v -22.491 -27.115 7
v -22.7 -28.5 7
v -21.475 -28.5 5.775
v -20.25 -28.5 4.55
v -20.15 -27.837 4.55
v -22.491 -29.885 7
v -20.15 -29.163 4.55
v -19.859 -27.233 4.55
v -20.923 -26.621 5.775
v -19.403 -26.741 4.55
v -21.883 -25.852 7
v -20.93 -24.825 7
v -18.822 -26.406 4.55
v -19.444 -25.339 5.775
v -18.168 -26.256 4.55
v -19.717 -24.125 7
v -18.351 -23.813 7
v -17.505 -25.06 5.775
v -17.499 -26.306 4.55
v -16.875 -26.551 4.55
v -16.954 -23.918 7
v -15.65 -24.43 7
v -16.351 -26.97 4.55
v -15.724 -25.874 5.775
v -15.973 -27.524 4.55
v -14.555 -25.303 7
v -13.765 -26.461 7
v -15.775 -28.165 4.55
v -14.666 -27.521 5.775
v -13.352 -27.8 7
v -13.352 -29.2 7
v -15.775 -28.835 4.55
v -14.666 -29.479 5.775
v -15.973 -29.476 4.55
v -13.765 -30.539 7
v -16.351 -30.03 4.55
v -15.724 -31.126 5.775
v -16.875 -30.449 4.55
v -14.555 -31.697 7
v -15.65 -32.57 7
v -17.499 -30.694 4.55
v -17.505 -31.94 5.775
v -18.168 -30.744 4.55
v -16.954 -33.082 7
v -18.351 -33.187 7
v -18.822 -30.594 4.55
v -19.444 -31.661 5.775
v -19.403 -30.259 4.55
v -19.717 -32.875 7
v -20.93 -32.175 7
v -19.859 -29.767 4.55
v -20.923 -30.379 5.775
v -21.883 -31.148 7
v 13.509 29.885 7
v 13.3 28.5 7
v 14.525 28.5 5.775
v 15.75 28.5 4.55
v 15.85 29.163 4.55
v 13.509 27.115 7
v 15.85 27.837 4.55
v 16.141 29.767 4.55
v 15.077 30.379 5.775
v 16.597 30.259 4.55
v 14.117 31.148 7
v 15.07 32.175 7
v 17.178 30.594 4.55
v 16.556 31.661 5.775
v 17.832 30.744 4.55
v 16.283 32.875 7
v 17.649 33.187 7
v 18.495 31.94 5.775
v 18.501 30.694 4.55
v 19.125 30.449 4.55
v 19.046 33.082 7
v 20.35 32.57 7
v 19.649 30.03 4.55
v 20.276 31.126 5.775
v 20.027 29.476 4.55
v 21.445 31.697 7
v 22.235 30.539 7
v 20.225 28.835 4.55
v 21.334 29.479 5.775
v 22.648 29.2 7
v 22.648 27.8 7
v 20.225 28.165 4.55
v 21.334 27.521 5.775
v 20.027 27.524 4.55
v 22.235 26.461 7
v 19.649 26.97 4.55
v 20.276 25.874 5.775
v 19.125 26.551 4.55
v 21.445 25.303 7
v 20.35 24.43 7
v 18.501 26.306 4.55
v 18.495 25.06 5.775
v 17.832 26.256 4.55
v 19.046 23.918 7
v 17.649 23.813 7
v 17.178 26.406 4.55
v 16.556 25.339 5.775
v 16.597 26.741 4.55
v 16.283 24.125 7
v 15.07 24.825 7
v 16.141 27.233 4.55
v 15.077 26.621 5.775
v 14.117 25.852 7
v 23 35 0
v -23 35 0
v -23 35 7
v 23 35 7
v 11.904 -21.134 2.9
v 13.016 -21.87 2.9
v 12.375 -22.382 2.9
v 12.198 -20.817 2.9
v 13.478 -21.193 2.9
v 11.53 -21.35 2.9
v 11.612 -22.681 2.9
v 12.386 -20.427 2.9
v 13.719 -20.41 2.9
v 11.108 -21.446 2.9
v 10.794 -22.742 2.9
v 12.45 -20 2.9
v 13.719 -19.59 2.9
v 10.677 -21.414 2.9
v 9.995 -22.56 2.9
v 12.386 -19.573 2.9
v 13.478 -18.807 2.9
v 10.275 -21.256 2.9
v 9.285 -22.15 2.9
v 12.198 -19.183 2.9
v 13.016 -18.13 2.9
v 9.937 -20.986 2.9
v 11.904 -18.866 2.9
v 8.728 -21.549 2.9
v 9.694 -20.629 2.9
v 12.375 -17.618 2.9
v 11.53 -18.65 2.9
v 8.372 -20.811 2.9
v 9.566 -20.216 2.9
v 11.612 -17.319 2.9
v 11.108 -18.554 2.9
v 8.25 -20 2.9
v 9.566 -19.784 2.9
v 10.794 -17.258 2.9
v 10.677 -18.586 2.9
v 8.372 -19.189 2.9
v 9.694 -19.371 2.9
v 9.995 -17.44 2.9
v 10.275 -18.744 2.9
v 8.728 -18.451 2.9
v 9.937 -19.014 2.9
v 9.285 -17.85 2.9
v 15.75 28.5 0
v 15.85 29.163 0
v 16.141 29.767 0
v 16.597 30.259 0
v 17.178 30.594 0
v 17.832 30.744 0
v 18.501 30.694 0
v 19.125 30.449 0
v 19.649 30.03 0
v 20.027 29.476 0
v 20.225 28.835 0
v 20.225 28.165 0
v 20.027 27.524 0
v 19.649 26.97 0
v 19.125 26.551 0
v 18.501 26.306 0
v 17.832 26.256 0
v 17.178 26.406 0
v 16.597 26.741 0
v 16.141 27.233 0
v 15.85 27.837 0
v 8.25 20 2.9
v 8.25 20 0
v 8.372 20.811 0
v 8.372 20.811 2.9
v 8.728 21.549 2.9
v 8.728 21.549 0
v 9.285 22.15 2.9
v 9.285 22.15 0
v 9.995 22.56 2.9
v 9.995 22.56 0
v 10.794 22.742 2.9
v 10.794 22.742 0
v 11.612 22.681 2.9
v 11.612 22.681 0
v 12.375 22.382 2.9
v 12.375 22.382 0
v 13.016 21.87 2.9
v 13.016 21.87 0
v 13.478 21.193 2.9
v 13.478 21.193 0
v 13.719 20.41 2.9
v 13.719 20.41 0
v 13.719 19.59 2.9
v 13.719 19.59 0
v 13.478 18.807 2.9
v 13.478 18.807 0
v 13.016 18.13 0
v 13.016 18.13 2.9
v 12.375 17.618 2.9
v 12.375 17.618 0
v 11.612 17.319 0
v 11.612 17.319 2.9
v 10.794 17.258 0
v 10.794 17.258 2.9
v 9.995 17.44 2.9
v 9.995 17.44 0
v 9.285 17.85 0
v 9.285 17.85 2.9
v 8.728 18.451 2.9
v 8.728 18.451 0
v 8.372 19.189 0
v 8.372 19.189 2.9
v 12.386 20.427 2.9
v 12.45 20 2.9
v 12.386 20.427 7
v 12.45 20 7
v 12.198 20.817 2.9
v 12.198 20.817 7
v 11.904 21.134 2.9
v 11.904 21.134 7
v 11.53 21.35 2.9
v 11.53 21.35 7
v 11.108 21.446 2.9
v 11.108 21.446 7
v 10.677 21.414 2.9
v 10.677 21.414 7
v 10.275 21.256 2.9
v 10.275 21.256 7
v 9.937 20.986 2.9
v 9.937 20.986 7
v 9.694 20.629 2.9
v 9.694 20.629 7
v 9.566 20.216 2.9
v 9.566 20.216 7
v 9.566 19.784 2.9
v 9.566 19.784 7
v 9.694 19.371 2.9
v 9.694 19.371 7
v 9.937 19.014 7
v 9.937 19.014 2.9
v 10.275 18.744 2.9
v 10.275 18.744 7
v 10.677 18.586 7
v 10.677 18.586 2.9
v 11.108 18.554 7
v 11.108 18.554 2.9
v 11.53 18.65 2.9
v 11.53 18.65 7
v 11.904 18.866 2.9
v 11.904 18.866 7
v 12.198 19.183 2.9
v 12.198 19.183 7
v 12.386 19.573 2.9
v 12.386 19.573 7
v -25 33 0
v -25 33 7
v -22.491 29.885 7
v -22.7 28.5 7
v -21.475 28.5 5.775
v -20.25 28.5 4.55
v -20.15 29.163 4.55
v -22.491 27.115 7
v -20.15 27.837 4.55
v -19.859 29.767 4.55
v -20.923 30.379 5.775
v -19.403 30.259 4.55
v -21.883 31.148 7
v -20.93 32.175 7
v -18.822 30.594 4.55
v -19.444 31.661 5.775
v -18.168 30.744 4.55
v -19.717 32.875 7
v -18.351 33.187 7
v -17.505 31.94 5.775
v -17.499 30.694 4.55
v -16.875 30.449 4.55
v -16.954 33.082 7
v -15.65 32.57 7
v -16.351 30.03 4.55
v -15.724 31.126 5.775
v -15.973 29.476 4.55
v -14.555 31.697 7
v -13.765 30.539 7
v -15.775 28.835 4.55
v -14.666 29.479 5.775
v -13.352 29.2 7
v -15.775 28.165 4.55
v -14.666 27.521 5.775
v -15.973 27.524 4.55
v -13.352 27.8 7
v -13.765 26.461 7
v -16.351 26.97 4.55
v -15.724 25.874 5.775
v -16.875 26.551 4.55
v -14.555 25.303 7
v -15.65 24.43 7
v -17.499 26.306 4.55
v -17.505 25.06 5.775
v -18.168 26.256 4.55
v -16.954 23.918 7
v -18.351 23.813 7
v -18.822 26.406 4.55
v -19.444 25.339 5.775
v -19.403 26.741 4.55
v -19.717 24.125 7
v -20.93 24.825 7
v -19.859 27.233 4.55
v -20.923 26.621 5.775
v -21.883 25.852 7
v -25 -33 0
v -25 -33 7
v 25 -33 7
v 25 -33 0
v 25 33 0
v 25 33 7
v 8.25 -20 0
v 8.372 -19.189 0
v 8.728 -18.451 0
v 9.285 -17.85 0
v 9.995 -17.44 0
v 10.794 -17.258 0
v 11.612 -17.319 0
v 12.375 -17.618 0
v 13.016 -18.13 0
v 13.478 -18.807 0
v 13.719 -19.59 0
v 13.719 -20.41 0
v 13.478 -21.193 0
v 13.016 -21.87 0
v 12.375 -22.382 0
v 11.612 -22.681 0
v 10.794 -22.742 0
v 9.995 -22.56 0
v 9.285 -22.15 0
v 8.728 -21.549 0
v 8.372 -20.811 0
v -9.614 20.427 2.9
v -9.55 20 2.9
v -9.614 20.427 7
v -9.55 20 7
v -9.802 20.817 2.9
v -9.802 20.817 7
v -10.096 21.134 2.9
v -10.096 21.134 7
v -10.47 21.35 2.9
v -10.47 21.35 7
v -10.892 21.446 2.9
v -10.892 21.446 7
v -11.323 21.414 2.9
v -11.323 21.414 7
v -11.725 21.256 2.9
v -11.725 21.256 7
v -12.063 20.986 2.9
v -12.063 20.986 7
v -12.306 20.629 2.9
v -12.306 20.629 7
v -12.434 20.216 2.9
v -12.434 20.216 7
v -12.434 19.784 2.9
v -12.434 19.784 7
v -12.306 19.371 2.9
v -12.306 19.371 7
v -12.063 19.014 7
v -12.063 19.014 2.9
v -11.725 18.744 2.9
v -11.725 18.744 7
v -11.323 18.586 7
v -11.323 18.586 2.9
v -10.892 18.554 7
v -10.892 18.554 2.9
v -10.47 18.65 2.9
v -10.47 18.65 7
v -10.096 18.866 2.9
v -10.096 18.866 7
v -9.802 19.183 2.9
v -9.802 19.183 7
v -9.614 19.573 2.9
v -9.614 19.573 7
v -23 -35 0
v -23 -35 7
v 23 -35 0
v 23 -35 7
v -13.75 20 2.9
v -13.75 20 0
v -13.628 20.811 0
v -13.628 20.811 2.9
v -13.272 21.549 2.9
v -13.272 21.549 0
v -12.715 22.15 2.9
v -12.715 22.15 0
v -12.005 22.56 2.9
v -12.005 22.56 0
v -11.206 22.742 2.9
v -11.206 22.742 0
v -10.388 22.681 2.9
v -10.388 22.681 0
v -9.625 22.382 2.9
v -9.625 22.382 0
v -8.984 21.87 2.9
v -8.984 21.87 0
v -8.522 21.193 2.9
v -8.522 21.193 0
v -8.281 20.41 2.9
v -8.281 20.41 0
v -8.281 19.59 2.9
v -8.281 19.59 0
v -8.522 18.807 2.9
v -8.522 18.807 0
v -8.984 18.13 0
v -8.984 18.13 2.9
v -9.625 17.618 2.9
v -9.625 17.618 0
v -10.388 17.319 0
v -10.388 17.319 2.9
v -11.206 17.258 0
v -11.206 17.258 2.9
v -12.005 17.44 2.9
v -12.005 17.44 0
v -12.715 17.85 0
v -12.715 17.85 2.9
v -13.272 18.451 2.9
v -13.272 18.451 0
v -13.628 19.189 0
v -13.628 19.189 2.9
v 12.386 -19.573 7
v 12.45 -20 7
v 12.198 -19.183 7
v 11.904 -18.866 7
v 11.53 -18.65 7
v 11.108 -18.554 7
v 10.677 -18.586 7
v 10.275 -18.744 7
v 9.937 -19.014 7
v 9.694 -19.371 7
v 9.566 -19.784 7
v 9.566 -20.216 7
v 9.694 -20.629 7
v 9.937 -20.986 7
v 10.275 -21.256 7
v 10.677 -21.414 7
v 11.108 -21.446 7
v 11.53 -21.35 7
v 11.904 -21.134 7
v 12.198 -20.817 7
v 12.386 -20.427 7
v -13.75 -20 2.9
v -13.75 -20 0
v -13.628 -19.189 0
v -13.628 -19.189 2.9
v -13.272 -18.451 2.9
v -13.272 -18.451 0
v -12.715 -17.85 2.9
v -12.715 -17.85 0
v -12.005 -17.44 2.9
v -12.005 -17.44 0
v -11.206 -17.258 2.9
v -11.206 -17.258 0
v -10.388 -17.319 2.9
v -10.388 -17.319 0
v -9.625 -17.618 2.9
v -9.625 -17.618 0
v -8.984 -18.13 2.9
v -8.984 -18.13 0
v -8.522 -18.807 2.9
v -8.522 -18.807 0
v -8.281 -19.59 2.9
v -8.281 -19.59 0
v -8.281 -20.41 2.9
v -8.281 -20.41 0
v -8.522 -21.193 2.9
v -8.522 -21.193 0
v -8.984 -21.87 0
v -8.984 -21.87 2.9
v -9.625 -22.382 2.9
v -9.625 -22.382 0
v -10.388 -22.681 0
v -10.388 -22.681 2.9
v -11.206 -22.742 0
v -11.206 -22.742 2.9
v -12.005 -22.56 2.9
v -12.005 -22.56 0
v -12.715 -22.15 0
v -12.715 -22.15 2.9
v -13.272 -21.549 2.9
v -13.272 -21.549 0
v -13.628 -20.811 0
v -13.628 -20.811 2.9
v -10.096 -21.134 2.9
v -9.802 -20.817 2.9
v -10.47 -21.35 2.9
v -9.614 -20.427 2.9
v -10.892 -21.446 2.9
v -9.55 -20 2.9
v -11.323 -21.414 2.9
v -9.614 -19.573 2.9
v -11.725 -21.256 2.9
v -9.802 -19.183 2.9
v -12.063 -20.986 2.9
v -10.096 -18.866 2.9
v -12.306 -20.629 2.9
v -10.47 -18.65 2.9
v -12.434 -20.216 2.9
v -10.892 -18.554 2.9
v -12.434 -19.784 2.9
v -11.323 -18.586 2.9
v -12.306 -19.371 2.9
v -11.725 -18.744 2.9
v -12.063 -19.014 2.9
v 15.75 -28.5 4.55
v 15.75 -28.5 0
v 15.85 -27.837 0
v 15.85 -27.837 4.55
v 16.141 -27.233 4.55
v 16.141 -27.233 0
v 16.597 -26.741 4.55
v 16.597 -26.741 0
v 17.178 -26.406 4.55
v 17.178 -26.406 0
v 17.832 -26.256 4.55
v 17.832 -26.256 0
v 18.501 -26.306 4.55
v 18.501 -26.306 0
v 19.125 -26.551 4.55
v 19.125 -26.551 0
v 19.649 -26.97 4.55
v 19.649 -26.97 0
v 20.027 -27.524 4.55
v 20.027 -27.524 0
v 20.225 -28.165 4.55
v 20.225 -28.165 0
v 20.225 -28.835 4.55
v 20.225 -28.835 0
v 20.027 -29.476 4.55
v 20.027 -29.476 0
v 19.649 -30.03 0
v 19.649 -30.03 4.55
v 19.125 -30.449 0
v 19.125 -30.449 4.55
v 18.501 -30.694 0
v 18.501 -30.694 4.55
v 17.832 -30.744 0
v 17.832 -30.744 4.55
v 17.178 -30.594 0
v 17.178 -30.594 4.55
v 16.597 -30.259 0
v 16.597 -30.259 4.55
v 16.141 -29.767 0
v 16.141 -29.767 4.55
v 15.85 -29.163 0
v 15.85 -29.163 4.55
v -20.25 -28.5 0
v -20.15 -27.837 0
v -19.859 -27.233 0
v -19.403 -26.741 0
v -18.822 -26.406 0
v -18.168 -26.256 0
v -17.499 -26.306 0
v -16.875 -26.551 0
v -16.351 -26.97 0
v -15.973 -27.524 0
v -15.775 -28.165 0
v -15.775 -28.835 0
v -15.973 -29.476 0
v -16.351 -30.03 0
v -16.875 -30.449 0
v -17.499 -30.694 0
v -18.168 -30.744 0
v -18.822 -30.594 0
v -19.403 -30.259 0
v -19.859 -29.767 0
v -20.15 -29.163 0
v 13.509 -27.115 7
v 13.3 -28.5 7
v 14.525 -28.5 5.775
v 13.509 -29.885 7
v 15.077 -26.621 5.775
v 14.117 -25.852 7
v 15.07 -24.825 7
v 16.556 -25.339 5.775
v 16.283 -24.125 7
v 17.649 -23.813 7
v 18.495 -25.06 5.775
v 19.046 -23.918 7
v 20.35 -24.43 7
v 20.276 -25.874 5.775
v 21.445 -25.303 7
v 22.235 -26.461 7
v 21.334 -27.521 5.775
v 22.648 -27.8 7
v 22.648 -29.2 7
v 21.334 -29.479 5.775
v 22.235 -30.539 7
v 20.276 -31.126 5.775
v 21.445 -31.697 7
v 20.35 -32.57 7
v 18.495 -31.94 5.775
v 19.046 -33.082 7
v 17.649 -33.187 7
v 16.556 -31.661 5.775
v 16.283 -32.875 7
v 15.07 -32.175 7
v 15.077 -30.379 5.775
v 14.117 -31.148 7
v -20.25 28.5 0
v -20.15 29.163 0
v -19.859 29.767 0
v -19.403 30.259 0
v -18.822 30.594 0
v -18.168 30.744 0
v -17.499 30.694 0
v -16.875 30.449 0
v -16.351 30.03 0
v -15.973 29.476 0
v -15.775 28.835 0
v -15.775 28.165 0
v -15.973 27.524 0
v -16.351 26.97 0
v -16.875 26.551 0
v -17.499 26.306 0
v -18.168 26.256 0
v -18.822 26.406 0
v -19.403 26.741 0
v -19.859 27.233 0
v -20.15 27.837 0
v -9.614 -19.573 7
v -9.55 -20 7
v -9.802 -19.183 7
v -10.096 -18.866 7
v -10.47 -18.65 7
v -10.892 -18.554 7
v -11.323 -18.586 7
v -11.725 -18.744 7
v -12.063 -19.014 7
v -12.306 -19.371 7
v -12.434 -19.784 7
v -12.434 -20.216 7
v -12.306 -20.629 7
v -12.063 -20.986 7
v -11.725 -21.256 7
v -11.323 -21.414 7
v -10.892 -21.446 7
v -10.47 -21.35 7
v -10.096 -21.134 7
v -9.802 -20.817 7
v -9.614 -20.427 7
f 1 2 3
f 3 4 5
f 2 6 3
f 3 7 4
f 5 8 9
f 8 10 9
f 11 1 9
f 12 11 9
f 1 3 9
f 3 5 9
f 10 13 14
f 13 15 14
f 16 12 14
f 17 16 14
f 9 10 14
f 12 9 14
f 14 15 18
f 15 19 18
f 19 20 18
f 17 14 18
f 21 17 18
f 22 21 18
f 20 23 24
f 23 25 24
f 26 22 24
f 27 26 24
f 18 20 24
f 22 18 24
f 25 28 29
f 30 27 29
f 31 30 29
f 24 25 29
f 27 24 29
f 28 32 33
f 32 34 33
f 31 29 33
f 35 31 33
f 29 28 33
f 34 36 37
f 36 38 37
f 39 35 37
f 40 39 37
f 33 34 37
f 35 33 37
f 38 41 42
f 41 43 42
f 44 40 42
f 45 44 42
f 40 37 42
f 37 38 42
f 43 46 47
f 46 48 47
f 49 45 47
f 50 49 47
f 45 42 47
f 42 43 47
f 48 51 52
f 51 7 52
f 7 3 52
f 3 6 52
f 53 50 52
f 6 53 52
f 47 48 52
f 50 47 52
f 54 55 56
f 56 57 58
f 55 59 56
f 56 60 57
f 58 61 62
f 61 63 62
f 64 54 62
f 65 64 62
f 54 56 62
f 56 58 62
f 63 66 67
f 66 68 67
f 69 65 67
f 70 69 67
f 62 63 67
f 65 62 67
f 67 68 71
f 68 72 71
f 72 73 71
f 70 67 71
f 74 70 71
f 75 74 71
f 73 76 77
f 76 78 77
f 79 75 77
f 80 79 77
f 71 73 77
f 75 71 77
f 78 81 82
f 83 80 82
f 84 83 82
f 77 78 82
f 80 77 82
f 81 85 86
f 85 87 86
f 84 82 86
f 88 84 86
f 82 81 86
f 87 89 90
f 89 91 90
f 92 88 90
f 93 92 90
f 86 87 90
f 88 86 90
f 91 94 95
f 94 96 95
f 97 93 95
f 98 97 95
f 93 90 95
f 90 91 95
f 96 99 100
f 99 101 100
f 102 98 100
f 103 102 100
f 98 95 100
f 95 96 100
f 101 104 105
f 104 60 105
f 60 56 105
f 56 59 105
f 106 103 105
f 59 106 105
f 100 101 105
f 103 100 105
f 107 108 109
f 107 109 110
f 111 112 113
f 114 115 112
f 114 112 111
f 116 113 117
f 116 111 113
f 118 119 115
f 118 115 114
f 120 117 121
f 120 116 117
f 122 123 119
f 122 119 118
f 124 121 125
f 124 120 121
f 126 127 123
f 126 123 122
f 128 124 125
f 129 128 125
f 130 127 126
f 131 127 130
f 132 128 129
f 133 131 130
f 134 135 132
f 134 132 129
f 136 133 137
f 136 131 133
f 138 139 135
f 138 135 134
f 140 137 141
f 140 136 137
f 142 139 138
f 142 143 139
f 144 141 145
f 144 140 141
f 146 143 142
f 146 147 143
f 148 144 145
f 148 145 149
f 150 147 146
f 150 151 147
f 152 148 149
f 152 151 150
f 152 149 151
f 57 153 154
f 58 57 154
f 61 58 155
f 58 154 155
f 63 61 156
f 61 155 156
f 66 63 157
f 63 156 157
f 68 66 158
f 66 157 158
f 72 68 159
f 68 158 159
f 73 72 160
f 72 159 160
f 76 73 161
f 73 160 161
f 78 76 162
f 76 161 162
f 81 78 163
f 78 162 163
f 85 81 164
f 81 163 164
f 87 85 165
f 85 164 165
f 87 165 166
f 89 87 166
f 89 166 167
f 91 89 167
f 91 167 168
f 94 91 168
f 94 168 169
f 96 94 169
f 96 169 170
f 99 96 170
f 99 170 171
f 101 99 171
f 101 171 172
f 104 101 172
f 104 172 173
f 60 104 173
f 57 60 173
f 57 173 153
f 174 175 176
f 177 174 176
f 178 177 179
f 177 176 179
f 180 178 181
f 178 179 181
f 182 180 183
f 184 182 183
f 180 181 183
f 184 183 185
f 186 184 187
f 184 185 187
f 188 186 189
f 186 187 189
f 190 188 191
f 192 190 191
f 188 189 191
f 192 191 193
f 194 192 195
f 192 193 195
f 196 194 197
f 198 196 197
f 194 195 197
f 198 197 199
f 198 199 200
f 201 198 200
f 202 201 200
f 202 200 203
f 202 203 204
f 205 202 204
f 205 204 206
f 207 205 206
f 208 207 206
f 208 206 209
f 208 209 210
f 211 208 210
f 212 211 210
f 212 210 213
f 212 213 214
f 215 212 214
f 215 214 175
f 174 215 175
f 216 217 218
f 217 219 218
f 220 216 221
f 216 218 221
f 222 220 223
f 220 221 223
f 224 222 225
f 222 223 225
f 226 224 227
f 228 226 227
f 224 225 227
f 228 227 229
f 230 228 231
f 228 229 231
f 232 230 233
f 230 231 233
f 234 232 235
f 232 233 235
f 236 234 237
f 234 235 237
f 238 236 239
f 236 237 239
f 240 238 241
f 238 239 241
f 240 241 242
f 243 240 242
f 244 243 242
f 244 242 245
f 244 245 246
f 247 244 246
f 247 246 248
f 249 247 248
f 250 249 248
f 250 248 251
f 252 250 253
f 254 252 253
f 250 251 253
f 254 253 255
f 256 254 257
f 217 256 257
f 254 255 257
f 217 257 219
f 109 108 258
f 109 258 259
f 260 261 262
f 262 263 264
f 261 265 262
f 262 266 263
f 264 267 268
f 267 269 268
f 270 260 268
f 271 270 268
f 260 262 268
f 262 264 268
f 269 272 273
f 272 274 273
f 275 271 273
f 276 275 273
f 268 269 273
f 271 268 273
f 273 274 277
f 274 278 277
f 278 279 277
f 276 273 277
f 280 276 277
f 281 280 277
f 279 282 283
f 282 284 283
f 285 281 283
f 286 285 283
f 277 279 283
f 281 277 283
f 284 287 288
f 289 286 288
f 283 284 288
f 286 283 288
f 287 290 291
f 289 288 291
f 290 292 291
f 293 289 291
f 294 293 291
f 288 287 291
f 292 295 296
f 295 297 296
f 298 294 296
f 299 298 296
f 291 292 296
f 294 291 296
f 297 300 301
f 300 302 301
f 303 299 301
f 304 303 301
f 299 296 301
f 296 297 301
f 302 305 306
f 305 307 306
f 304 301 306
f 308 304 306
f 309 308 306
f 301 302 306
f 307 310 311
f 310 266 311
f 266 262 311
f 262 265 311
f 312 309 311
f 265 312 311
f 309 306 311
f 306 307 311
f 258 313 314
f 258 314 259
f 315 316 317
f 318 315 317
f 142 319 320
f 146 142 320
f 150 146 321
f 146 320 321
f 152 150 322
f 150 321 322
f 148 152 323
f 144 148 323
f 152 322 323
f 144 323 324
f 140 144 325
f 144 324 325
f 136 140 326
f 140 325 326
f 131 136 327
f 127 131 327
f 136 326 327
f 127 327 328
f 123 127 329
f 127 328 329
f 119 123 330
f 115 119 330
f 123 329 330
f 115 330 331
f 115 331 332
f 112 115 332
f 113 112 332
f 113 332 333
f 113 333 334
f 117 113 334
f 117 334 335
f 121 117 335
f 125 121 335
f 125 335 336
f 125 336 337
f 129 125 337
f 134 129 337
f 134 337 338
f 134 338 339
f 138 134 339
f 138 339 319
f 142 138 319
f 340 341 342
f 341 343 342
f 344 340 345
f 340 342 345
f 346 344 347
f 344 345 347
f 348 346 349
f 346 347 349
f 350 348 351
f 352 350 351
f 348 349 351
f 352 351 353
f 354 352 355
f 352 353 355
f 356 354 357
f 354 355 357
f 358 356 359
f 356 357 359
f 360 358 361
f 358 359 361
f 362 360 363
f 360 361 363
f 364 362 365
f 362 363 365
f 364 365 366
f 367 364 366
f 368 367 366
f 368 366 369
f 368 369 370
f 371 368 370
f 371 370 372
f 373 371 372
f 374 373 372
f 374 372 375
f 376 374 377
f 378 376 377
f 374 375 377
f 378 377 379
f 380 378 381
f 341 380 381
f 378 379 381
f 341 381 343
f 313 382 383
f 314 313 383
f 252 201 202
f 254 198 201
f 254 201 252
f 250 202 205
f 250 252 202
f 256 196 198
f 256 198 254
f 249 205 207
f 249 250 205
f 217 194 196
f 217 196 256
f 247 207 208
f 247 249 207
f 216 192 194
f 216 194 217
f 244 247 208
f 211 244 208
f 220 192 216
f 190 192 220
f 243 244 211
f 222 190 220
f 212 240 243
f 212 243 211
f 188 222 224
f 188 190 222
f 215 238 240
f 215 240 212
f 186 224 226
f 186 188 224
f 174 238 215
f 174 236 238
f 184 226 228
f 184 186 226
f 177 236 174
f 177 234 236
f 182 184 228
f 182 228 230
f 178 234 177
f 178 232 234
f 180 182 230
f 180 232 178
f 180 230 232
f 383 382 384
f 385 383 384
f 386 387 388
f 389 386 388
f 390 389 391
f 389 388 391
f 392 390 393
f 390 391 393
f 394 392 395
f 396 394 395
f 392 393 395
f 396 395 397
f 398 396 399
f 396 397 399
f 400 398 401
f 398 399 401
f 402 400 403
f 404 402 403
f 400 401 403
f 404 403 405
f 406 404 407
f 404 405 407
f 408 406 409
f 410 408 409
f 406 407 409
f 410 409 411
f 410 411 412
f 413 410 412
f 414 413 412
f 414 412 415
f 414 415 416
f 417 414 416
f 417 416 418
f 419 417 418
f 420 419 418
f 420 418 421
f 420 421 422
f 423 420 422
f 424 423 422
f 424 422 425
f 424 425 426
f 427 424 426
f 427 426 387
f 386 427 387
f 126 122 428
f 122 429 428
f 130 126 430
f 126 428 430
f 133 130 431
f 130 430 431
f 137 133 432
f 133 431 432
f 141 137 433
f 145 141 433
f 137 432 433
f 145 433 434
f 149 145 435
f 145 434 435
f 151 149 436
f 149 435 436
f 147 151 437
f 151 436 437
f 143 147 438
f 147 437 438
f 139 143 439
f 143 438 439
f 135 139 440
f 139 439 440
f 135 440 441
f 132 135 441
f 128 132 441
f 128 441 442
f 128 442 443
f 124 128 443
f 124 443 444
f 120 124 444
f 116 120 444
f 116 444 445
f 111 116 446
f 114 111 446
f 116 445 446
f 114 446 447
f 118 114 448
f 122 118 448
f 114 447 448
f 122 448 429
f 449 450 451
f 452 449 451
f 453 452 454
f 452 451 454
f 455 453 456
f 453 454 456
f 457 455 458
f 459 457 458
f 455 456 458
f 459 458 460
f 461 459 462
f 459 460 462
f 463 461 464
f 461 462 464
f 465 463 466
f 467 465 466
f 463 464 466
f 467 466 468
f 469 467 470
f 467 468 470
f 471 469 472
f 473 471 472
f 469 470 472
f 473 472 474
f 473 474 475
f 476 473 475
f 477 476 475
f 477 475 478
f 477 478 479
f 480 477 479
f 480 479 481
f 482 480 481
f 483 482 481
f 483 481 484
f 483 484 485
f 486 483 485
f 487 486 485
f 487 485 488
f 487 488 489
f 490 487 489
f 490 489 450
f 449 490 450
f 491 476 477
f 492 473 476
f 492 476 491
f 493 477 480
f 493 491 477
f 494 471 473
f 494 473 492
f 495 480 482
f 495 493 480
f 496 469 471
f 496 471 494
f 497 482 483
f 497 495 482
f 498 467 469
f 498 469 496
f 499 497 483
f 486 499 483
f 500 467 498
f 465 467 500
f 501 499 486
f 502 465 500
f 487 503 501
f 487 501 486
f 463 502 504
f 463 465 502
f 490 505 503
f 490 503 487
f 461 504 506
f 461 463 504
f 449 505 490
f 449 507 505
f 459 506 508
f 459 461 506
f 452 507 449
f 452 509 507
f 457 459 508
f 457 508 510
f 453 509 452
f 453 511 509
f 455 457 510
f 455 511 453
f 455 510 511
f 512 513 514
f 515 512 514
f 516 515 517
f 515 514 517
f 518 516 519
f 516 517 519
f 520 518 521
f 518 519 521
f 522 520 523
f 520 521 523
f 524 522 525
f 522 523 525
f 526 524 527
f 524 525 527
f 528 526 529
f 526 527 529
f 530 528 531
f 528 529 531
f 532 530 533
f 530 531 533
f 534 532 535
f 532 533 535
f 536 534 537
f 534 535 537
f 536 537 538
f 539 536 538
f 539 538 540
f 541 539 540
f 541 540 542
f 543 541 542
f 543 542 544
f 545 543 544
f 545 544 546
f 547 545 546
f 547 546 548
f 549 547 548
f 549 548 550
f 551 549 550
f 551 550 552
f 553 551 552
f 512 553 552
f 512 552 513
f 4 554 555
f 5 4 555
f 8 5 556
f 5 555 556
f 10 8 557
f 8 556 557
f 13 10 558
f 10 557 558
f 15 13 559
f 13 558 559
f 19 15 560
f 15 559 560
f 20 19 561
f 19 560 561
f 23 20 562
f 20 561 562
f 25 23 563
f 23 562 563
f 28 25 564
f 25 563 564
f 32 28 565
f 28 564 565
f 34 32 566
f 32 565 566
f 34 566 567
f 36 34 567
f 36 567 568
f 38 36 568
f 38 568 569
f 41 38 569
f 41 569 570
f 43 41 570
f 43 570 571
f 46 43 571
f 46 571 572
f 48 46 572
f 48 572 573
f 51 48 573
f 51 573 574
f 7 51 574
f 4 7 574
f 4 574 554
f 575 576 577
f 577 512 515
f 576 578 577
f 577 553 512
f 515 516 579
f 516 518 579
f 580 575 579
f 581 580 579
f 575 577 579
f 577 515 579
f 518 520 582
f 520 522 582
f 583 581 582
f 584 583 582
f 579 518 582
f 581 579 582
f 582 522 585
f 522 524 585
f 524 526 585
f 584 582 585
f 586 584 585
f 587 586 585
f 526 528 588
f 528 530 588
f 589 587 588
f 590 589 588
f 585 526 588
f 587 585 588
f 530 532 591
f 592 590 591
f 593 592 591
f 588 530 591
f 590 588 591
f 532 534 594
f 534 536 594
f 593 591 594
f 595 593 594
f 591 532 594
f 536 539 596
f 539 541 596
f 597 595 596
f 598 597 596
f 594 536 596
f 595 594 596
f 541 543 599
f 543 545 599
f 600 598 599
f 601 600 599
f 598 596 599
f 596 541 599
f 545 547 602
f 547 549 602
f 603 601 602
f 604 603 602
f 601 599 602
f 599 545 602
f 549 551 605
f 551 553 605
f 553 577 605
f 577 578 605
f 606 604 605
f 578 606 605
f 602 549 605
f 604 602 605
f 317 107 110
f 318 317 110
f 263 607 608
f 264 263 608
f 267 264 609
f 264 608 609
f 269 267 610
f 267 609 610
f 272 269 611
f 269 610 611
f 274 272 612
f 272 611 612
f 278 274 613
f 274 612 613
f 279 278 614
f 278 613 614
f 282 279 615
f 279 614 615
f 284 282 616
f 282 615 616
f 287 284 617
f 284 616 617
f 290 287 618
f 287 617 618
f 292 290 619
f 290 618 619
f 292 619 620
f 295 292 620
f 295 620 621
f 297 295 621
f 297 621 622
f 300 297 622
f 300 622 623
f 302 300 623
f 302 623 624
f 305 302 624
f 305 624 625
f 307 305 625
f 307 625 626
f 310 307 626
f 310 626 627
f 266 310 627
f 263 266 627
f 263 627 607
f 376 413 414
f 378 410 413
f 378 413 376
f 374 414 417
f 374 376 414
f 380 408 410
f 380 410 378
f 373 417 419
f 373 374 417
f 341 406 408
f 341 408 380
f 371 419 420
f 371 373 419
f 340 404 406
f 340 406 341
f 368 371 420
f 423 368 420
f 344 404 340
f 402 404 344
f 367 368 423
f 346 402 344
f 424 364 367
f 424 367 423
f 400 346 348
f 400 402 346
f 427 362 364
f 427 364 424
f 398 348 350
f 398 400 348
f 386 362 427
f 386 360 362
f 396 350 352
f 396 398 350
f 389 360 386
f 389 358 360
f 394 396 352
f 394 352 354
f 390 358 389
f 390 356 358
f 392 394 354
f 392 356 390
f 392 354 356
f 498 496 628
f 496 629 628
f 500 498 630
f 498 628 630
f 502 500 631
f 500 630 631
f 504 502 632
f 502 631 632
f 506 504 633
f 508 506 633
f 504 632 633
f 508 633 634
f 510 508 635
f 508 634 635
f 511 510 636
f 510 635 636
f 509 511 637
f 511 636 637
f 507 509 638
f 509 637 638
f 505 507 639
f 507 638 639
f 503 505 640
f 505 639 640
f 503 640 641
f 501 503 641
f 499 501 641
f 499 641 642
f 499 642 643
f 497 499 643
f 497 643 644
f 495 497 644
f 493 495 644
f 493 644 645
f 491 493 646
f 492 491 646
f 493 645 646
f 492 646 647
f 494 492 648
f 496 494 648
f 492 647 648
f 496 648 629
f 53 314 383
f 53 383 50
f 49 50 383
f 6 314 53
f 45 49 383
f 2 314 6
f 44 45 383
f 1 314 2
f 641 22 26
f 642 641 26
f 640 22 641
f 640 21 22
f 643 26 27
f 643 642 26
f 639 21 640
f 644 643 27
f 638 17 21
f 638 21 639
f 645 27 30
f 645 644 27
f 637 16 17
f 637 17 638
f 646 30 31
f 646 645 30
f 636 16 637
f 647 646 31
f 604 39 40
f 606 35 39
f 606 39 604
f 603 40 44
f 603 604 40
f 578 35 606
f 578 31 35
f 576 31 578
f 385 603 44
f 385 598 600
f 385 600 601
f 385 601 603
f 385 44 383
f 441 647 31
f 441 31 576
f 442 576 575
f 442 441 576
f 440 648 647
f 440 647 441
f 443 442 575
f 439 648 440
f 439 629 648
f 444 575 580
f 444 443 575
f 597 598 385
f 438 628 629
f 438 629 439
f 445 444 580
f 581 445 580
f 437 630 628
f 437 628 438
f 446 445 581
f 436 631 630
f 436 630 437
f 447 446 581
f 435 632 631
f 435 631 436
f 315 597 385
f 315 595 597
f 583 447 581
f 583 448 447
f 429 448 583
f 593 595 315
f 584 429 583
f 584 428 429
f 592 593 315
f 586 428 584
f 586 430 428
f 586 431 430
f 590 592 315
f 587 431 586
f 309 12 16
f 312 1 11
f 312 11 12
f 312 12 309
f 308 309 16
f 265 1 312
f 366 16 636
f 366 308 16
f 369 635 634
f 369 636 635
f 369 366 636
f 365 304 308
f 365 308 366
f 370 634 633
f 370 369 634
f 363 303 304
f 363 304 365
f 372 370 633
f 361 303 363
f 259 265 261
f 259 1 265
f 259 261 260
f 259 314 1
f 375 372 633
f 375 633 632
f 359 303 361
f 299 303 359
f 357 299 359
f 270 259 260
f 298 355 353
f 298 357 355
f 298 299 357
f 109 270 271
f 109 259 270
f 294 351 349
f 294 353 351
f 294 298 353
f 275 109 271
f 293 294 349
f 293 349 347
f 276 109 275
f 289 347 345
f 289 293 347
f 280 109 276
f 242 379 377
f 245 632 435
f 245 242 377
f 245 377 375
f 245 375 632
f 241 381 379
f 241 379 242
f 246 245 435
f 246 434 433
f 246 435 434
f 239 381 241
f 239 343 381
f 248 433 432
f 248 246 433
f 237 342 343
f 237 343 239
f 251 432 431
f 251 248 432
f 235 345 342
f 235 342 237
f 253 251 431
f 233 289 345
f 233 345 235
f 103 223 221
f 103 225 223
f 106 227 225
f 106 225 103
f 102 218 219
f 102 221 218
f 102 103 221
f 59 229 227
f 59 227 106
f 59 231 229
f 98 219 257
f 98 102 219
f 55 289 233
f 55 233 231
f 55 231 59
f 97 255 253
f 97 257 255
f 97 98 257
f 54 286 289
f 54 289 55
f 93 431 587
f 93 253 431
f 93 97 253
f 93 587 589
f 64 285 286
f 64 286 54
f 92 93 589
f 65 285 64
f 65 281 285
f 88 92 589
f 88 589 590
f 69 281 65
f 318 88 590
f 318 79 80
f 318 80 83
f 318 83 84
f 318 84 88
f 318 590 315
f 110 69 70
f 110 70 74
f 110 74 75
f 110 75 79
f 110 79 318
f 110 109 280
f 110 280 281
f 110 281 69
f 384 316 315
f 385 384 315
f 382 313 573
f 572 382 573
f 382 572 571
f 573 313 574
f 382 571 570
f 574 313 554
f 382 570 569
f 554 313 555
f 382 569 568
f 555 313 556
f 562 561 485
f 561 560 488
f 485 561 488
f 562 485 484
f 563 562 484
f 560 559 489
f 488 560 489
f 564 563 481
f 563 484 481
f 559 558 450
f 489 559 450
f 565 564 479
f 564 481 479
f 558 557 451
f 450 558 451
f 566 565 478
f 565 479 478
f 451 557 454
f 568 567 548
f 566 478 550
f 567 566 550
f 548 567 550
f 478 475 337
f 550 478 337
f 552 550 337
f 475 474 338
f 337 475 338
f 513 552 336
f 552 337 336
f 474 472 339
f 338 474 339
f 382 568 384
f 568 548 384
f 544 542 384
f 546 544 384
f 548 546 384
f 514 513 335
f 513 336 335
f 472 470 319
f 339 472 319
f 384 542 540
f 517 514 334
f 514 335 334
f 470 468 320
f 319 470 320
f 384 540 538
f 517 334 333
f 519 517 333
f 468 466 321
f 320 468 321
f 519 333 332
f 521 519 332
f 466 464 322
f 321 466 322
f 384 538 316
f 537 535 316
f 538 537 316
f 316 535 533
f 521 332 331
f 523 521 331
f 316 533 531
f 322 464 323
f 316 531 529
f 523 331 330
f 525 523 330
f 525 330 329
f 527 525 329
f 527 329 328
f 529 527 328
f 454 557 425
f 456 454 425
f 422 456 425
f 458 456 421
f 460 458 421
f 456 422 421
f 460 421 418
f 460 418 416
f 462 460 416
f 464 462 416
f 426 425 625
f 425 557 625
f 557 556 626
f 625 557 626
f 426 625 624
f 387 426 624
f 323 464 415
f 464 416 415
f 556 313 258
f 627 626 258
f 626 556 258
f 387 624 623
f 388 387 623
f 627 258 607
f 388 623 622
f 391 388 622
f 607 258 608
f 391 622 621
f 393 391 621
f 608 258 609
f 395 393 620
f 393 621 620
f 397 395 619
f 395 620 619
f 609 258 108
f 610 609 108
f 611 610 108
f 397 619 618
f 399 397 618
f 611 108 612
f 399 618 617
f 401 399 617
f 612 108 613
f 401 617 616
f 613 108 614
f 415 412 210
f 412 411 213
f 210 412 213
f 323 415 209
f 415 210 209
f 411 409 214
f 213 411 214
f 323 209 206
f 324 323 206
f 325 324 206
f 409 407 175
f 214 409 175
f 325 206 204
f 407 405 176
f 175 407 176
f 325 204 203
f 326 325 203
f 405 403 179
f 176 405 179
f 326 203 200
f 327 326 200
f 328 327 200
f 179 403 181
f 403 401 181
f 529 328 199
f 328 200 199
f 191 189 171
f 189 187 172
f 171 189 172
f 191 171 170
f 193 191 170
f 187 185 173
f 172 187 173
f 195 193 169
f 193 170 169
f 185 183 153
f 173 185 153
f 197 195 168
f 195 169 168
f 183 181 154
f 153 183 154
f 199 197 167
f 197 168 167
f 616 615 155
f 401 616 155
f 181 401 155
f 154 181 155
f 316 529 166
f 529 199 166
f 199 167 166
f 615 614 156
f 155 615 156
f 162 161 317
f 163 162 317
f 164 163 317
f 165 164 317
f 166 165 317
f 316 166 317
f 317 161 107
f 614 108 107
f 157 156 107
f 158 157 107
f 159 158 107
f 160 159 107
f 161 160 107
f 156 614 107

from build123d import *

# Parameters (mm, degrees)
SKETCH1_W                                            = 50
SKETCH1_H                                            = 70
SKETCH1_R                                            = 1.35
SKETCH1_R_2                                          = 1.5
BOSS_EXTRUDE1_DEPTH                                  = 7
CHAMFER1_SIZE                                        = 2
CHAMFER2_SIZE                                        = 2
CHAMFER3_SIZE                                        = 2
CHAMFER4_SIZE                                        = 2
CSK_FOR_M4_COUNTERSUNK_FLAT_HEAD_SCREW1_D            = 4.5
CSK_FOR_M4_COUNTERSUNK_FLAT_HEAD_SCREW1_DEPTH        = 7
CSK_FOR_M4_COUNTERSUNK_FLAT_HEAD_SCREW1_CSINK_D      = 9.4
CSK_FOR_M4_COUNTERSUNK_FLAT_HEAD_SCREW1_CSINK_ANGLE  = 90
CBORE_FOR_M2_5_HEX_SOCKET_HEAD_CAP_SCREW_D           = 2.9
CBORE_FOR_M2_5_HEX_SOCKET_HEAD_CAP_SCREW_CBORE_D     = 5.5
CBORE_FOR_M2_5_HEX_SOCKET_HEAD_CAP_SCREW_CBORE_DEPTH = 2.9


with BuildPart() as part:
    # Sketch1 → Boss-Extrude1 (new body)
    with BuildSketch(Plane.XY):
        Rectangle(SKETCH1_W, SKETCH1_H)
        with Locations(Location((11, 20, 0), (0, 0, 180))):
            Circle(SKETCH1_R, mode=Mode.SUBTRACT)
        with Locations(Location((-11, 20, 0), (0, 0, 180))):
            Circle(SKETCH1_R, mode=Mode.SUBTRACT)
        with Locations(Location((-11, -20, 0), (0, 0, 180))):
            Circle(SKETCH1_R, mode=Mode.SUBTRACT)
        with Locations(Location((11, -20, 0), (0, 0, 180))):
            Circle(SKETCH1_R, mode=Mode.SUBTRACT)
        with Locations(Location((18, 28.5, 0), (0, 0, 180))):
            Circle(SKETCH1_R_2, mode=Mode.SUBTRACT)
        with Locations(Location((-18, 28.5, 0), (0, 0, 180))):
            Circle(SKETCH1_R_2, mode=Mode.SUBTRACT)
        with Locations(Location((-18, -28.5, 0), (0, 0, 180))):
            Circle(SKETCH1_R_2, mode=Mode.SUBTRACT)
        with Locations(Location((18, -28.5, 0), (0, 0, 180))):
            Circle(SKETCH1_R_2, mode=Mode.SUBTRACT)
    extrude(amount=BOSS_EXTRUDE1_DEPTH)

    # Chamfer1
    chamfer1_edges = [part.edges().sort_by_distance(p)[0] for p in [
        (-25, 35, 3.5),
    ]]
    chamfer(chamfer1_edges, length=CHAMFER1_SIZE)

    # Chamfer2
    chamfer2_edges = [part.edges().sort_by_distance(p)[0] for p in [
        (-25, -35, 3.5),
    ]]
    chamfer(chamfer2_edges, length=CHAMFER2_SIZE)

    # Chamfer3
    chamfer3_edges = [part.edges().sort_by_distance(p)[0] for p in [
        (25, -35, 3.5),
    ]]
    chamfer(chamfer3_edges, length=CHAMFER3_SIZE)

    # Chamfer4
    chamfer4_edges = [part.edges().sort_by_distance(p)[0] for p in [
        (25, 35, 3.5),
    ]]
    chamfer(chamfer4_edges, length=CHAMFER4_SIZE)

    # CSK for M4 Countersunk Flat Head Screw1
    with Locations(Plane.XY.offset(7)):
        with Locations((18, 28.5), (18, -28.5), (-18, -28.5), (-18, 28.5)):
            CounterSinkHole(CSK_FOR_M4_COUNTERSUNK_FLAT_HEAD_SCREW1_D / 2, CSK_FOR_M4_COUNTERSUNK_FLAT_HEAD_SCREW1_CSINK_D / 2, depth=CSK_FOR_M4_COUNTERSUNK_FLAT_HEAD_SCREW1_DEPTH, counter_sink_angle=CSK_FOR_M4_COUNTERSUNK_FLAT_HEAD_SCREW1_CSINK_ANGLE)

    # CBORE for M2.5 Hex Socket Head Cap Screw1 (through all)
    with Locations(Plane(origin=(0, 0, 0), x_dir=(-1, 0, 0), z_dir=(0, 0, -1))):
        with Locations((11, 20), (-11, 20), (-11, -20), (11, -20)):
            CounterBoreHole(CBORE_FOR_M2_5_HEX_SOCKET_HEAD_CAP_SCREW_D / 2, CBORE_FOR_M2_5_HEX_SOCKET_HEAD_CAP_SCREW_CBORE_D / 2, CBORE_FOR_M2_5_HEX_SOCKET_HEAD_CAP_SCREW_CBORE_DEPTH)


solid = part.part
